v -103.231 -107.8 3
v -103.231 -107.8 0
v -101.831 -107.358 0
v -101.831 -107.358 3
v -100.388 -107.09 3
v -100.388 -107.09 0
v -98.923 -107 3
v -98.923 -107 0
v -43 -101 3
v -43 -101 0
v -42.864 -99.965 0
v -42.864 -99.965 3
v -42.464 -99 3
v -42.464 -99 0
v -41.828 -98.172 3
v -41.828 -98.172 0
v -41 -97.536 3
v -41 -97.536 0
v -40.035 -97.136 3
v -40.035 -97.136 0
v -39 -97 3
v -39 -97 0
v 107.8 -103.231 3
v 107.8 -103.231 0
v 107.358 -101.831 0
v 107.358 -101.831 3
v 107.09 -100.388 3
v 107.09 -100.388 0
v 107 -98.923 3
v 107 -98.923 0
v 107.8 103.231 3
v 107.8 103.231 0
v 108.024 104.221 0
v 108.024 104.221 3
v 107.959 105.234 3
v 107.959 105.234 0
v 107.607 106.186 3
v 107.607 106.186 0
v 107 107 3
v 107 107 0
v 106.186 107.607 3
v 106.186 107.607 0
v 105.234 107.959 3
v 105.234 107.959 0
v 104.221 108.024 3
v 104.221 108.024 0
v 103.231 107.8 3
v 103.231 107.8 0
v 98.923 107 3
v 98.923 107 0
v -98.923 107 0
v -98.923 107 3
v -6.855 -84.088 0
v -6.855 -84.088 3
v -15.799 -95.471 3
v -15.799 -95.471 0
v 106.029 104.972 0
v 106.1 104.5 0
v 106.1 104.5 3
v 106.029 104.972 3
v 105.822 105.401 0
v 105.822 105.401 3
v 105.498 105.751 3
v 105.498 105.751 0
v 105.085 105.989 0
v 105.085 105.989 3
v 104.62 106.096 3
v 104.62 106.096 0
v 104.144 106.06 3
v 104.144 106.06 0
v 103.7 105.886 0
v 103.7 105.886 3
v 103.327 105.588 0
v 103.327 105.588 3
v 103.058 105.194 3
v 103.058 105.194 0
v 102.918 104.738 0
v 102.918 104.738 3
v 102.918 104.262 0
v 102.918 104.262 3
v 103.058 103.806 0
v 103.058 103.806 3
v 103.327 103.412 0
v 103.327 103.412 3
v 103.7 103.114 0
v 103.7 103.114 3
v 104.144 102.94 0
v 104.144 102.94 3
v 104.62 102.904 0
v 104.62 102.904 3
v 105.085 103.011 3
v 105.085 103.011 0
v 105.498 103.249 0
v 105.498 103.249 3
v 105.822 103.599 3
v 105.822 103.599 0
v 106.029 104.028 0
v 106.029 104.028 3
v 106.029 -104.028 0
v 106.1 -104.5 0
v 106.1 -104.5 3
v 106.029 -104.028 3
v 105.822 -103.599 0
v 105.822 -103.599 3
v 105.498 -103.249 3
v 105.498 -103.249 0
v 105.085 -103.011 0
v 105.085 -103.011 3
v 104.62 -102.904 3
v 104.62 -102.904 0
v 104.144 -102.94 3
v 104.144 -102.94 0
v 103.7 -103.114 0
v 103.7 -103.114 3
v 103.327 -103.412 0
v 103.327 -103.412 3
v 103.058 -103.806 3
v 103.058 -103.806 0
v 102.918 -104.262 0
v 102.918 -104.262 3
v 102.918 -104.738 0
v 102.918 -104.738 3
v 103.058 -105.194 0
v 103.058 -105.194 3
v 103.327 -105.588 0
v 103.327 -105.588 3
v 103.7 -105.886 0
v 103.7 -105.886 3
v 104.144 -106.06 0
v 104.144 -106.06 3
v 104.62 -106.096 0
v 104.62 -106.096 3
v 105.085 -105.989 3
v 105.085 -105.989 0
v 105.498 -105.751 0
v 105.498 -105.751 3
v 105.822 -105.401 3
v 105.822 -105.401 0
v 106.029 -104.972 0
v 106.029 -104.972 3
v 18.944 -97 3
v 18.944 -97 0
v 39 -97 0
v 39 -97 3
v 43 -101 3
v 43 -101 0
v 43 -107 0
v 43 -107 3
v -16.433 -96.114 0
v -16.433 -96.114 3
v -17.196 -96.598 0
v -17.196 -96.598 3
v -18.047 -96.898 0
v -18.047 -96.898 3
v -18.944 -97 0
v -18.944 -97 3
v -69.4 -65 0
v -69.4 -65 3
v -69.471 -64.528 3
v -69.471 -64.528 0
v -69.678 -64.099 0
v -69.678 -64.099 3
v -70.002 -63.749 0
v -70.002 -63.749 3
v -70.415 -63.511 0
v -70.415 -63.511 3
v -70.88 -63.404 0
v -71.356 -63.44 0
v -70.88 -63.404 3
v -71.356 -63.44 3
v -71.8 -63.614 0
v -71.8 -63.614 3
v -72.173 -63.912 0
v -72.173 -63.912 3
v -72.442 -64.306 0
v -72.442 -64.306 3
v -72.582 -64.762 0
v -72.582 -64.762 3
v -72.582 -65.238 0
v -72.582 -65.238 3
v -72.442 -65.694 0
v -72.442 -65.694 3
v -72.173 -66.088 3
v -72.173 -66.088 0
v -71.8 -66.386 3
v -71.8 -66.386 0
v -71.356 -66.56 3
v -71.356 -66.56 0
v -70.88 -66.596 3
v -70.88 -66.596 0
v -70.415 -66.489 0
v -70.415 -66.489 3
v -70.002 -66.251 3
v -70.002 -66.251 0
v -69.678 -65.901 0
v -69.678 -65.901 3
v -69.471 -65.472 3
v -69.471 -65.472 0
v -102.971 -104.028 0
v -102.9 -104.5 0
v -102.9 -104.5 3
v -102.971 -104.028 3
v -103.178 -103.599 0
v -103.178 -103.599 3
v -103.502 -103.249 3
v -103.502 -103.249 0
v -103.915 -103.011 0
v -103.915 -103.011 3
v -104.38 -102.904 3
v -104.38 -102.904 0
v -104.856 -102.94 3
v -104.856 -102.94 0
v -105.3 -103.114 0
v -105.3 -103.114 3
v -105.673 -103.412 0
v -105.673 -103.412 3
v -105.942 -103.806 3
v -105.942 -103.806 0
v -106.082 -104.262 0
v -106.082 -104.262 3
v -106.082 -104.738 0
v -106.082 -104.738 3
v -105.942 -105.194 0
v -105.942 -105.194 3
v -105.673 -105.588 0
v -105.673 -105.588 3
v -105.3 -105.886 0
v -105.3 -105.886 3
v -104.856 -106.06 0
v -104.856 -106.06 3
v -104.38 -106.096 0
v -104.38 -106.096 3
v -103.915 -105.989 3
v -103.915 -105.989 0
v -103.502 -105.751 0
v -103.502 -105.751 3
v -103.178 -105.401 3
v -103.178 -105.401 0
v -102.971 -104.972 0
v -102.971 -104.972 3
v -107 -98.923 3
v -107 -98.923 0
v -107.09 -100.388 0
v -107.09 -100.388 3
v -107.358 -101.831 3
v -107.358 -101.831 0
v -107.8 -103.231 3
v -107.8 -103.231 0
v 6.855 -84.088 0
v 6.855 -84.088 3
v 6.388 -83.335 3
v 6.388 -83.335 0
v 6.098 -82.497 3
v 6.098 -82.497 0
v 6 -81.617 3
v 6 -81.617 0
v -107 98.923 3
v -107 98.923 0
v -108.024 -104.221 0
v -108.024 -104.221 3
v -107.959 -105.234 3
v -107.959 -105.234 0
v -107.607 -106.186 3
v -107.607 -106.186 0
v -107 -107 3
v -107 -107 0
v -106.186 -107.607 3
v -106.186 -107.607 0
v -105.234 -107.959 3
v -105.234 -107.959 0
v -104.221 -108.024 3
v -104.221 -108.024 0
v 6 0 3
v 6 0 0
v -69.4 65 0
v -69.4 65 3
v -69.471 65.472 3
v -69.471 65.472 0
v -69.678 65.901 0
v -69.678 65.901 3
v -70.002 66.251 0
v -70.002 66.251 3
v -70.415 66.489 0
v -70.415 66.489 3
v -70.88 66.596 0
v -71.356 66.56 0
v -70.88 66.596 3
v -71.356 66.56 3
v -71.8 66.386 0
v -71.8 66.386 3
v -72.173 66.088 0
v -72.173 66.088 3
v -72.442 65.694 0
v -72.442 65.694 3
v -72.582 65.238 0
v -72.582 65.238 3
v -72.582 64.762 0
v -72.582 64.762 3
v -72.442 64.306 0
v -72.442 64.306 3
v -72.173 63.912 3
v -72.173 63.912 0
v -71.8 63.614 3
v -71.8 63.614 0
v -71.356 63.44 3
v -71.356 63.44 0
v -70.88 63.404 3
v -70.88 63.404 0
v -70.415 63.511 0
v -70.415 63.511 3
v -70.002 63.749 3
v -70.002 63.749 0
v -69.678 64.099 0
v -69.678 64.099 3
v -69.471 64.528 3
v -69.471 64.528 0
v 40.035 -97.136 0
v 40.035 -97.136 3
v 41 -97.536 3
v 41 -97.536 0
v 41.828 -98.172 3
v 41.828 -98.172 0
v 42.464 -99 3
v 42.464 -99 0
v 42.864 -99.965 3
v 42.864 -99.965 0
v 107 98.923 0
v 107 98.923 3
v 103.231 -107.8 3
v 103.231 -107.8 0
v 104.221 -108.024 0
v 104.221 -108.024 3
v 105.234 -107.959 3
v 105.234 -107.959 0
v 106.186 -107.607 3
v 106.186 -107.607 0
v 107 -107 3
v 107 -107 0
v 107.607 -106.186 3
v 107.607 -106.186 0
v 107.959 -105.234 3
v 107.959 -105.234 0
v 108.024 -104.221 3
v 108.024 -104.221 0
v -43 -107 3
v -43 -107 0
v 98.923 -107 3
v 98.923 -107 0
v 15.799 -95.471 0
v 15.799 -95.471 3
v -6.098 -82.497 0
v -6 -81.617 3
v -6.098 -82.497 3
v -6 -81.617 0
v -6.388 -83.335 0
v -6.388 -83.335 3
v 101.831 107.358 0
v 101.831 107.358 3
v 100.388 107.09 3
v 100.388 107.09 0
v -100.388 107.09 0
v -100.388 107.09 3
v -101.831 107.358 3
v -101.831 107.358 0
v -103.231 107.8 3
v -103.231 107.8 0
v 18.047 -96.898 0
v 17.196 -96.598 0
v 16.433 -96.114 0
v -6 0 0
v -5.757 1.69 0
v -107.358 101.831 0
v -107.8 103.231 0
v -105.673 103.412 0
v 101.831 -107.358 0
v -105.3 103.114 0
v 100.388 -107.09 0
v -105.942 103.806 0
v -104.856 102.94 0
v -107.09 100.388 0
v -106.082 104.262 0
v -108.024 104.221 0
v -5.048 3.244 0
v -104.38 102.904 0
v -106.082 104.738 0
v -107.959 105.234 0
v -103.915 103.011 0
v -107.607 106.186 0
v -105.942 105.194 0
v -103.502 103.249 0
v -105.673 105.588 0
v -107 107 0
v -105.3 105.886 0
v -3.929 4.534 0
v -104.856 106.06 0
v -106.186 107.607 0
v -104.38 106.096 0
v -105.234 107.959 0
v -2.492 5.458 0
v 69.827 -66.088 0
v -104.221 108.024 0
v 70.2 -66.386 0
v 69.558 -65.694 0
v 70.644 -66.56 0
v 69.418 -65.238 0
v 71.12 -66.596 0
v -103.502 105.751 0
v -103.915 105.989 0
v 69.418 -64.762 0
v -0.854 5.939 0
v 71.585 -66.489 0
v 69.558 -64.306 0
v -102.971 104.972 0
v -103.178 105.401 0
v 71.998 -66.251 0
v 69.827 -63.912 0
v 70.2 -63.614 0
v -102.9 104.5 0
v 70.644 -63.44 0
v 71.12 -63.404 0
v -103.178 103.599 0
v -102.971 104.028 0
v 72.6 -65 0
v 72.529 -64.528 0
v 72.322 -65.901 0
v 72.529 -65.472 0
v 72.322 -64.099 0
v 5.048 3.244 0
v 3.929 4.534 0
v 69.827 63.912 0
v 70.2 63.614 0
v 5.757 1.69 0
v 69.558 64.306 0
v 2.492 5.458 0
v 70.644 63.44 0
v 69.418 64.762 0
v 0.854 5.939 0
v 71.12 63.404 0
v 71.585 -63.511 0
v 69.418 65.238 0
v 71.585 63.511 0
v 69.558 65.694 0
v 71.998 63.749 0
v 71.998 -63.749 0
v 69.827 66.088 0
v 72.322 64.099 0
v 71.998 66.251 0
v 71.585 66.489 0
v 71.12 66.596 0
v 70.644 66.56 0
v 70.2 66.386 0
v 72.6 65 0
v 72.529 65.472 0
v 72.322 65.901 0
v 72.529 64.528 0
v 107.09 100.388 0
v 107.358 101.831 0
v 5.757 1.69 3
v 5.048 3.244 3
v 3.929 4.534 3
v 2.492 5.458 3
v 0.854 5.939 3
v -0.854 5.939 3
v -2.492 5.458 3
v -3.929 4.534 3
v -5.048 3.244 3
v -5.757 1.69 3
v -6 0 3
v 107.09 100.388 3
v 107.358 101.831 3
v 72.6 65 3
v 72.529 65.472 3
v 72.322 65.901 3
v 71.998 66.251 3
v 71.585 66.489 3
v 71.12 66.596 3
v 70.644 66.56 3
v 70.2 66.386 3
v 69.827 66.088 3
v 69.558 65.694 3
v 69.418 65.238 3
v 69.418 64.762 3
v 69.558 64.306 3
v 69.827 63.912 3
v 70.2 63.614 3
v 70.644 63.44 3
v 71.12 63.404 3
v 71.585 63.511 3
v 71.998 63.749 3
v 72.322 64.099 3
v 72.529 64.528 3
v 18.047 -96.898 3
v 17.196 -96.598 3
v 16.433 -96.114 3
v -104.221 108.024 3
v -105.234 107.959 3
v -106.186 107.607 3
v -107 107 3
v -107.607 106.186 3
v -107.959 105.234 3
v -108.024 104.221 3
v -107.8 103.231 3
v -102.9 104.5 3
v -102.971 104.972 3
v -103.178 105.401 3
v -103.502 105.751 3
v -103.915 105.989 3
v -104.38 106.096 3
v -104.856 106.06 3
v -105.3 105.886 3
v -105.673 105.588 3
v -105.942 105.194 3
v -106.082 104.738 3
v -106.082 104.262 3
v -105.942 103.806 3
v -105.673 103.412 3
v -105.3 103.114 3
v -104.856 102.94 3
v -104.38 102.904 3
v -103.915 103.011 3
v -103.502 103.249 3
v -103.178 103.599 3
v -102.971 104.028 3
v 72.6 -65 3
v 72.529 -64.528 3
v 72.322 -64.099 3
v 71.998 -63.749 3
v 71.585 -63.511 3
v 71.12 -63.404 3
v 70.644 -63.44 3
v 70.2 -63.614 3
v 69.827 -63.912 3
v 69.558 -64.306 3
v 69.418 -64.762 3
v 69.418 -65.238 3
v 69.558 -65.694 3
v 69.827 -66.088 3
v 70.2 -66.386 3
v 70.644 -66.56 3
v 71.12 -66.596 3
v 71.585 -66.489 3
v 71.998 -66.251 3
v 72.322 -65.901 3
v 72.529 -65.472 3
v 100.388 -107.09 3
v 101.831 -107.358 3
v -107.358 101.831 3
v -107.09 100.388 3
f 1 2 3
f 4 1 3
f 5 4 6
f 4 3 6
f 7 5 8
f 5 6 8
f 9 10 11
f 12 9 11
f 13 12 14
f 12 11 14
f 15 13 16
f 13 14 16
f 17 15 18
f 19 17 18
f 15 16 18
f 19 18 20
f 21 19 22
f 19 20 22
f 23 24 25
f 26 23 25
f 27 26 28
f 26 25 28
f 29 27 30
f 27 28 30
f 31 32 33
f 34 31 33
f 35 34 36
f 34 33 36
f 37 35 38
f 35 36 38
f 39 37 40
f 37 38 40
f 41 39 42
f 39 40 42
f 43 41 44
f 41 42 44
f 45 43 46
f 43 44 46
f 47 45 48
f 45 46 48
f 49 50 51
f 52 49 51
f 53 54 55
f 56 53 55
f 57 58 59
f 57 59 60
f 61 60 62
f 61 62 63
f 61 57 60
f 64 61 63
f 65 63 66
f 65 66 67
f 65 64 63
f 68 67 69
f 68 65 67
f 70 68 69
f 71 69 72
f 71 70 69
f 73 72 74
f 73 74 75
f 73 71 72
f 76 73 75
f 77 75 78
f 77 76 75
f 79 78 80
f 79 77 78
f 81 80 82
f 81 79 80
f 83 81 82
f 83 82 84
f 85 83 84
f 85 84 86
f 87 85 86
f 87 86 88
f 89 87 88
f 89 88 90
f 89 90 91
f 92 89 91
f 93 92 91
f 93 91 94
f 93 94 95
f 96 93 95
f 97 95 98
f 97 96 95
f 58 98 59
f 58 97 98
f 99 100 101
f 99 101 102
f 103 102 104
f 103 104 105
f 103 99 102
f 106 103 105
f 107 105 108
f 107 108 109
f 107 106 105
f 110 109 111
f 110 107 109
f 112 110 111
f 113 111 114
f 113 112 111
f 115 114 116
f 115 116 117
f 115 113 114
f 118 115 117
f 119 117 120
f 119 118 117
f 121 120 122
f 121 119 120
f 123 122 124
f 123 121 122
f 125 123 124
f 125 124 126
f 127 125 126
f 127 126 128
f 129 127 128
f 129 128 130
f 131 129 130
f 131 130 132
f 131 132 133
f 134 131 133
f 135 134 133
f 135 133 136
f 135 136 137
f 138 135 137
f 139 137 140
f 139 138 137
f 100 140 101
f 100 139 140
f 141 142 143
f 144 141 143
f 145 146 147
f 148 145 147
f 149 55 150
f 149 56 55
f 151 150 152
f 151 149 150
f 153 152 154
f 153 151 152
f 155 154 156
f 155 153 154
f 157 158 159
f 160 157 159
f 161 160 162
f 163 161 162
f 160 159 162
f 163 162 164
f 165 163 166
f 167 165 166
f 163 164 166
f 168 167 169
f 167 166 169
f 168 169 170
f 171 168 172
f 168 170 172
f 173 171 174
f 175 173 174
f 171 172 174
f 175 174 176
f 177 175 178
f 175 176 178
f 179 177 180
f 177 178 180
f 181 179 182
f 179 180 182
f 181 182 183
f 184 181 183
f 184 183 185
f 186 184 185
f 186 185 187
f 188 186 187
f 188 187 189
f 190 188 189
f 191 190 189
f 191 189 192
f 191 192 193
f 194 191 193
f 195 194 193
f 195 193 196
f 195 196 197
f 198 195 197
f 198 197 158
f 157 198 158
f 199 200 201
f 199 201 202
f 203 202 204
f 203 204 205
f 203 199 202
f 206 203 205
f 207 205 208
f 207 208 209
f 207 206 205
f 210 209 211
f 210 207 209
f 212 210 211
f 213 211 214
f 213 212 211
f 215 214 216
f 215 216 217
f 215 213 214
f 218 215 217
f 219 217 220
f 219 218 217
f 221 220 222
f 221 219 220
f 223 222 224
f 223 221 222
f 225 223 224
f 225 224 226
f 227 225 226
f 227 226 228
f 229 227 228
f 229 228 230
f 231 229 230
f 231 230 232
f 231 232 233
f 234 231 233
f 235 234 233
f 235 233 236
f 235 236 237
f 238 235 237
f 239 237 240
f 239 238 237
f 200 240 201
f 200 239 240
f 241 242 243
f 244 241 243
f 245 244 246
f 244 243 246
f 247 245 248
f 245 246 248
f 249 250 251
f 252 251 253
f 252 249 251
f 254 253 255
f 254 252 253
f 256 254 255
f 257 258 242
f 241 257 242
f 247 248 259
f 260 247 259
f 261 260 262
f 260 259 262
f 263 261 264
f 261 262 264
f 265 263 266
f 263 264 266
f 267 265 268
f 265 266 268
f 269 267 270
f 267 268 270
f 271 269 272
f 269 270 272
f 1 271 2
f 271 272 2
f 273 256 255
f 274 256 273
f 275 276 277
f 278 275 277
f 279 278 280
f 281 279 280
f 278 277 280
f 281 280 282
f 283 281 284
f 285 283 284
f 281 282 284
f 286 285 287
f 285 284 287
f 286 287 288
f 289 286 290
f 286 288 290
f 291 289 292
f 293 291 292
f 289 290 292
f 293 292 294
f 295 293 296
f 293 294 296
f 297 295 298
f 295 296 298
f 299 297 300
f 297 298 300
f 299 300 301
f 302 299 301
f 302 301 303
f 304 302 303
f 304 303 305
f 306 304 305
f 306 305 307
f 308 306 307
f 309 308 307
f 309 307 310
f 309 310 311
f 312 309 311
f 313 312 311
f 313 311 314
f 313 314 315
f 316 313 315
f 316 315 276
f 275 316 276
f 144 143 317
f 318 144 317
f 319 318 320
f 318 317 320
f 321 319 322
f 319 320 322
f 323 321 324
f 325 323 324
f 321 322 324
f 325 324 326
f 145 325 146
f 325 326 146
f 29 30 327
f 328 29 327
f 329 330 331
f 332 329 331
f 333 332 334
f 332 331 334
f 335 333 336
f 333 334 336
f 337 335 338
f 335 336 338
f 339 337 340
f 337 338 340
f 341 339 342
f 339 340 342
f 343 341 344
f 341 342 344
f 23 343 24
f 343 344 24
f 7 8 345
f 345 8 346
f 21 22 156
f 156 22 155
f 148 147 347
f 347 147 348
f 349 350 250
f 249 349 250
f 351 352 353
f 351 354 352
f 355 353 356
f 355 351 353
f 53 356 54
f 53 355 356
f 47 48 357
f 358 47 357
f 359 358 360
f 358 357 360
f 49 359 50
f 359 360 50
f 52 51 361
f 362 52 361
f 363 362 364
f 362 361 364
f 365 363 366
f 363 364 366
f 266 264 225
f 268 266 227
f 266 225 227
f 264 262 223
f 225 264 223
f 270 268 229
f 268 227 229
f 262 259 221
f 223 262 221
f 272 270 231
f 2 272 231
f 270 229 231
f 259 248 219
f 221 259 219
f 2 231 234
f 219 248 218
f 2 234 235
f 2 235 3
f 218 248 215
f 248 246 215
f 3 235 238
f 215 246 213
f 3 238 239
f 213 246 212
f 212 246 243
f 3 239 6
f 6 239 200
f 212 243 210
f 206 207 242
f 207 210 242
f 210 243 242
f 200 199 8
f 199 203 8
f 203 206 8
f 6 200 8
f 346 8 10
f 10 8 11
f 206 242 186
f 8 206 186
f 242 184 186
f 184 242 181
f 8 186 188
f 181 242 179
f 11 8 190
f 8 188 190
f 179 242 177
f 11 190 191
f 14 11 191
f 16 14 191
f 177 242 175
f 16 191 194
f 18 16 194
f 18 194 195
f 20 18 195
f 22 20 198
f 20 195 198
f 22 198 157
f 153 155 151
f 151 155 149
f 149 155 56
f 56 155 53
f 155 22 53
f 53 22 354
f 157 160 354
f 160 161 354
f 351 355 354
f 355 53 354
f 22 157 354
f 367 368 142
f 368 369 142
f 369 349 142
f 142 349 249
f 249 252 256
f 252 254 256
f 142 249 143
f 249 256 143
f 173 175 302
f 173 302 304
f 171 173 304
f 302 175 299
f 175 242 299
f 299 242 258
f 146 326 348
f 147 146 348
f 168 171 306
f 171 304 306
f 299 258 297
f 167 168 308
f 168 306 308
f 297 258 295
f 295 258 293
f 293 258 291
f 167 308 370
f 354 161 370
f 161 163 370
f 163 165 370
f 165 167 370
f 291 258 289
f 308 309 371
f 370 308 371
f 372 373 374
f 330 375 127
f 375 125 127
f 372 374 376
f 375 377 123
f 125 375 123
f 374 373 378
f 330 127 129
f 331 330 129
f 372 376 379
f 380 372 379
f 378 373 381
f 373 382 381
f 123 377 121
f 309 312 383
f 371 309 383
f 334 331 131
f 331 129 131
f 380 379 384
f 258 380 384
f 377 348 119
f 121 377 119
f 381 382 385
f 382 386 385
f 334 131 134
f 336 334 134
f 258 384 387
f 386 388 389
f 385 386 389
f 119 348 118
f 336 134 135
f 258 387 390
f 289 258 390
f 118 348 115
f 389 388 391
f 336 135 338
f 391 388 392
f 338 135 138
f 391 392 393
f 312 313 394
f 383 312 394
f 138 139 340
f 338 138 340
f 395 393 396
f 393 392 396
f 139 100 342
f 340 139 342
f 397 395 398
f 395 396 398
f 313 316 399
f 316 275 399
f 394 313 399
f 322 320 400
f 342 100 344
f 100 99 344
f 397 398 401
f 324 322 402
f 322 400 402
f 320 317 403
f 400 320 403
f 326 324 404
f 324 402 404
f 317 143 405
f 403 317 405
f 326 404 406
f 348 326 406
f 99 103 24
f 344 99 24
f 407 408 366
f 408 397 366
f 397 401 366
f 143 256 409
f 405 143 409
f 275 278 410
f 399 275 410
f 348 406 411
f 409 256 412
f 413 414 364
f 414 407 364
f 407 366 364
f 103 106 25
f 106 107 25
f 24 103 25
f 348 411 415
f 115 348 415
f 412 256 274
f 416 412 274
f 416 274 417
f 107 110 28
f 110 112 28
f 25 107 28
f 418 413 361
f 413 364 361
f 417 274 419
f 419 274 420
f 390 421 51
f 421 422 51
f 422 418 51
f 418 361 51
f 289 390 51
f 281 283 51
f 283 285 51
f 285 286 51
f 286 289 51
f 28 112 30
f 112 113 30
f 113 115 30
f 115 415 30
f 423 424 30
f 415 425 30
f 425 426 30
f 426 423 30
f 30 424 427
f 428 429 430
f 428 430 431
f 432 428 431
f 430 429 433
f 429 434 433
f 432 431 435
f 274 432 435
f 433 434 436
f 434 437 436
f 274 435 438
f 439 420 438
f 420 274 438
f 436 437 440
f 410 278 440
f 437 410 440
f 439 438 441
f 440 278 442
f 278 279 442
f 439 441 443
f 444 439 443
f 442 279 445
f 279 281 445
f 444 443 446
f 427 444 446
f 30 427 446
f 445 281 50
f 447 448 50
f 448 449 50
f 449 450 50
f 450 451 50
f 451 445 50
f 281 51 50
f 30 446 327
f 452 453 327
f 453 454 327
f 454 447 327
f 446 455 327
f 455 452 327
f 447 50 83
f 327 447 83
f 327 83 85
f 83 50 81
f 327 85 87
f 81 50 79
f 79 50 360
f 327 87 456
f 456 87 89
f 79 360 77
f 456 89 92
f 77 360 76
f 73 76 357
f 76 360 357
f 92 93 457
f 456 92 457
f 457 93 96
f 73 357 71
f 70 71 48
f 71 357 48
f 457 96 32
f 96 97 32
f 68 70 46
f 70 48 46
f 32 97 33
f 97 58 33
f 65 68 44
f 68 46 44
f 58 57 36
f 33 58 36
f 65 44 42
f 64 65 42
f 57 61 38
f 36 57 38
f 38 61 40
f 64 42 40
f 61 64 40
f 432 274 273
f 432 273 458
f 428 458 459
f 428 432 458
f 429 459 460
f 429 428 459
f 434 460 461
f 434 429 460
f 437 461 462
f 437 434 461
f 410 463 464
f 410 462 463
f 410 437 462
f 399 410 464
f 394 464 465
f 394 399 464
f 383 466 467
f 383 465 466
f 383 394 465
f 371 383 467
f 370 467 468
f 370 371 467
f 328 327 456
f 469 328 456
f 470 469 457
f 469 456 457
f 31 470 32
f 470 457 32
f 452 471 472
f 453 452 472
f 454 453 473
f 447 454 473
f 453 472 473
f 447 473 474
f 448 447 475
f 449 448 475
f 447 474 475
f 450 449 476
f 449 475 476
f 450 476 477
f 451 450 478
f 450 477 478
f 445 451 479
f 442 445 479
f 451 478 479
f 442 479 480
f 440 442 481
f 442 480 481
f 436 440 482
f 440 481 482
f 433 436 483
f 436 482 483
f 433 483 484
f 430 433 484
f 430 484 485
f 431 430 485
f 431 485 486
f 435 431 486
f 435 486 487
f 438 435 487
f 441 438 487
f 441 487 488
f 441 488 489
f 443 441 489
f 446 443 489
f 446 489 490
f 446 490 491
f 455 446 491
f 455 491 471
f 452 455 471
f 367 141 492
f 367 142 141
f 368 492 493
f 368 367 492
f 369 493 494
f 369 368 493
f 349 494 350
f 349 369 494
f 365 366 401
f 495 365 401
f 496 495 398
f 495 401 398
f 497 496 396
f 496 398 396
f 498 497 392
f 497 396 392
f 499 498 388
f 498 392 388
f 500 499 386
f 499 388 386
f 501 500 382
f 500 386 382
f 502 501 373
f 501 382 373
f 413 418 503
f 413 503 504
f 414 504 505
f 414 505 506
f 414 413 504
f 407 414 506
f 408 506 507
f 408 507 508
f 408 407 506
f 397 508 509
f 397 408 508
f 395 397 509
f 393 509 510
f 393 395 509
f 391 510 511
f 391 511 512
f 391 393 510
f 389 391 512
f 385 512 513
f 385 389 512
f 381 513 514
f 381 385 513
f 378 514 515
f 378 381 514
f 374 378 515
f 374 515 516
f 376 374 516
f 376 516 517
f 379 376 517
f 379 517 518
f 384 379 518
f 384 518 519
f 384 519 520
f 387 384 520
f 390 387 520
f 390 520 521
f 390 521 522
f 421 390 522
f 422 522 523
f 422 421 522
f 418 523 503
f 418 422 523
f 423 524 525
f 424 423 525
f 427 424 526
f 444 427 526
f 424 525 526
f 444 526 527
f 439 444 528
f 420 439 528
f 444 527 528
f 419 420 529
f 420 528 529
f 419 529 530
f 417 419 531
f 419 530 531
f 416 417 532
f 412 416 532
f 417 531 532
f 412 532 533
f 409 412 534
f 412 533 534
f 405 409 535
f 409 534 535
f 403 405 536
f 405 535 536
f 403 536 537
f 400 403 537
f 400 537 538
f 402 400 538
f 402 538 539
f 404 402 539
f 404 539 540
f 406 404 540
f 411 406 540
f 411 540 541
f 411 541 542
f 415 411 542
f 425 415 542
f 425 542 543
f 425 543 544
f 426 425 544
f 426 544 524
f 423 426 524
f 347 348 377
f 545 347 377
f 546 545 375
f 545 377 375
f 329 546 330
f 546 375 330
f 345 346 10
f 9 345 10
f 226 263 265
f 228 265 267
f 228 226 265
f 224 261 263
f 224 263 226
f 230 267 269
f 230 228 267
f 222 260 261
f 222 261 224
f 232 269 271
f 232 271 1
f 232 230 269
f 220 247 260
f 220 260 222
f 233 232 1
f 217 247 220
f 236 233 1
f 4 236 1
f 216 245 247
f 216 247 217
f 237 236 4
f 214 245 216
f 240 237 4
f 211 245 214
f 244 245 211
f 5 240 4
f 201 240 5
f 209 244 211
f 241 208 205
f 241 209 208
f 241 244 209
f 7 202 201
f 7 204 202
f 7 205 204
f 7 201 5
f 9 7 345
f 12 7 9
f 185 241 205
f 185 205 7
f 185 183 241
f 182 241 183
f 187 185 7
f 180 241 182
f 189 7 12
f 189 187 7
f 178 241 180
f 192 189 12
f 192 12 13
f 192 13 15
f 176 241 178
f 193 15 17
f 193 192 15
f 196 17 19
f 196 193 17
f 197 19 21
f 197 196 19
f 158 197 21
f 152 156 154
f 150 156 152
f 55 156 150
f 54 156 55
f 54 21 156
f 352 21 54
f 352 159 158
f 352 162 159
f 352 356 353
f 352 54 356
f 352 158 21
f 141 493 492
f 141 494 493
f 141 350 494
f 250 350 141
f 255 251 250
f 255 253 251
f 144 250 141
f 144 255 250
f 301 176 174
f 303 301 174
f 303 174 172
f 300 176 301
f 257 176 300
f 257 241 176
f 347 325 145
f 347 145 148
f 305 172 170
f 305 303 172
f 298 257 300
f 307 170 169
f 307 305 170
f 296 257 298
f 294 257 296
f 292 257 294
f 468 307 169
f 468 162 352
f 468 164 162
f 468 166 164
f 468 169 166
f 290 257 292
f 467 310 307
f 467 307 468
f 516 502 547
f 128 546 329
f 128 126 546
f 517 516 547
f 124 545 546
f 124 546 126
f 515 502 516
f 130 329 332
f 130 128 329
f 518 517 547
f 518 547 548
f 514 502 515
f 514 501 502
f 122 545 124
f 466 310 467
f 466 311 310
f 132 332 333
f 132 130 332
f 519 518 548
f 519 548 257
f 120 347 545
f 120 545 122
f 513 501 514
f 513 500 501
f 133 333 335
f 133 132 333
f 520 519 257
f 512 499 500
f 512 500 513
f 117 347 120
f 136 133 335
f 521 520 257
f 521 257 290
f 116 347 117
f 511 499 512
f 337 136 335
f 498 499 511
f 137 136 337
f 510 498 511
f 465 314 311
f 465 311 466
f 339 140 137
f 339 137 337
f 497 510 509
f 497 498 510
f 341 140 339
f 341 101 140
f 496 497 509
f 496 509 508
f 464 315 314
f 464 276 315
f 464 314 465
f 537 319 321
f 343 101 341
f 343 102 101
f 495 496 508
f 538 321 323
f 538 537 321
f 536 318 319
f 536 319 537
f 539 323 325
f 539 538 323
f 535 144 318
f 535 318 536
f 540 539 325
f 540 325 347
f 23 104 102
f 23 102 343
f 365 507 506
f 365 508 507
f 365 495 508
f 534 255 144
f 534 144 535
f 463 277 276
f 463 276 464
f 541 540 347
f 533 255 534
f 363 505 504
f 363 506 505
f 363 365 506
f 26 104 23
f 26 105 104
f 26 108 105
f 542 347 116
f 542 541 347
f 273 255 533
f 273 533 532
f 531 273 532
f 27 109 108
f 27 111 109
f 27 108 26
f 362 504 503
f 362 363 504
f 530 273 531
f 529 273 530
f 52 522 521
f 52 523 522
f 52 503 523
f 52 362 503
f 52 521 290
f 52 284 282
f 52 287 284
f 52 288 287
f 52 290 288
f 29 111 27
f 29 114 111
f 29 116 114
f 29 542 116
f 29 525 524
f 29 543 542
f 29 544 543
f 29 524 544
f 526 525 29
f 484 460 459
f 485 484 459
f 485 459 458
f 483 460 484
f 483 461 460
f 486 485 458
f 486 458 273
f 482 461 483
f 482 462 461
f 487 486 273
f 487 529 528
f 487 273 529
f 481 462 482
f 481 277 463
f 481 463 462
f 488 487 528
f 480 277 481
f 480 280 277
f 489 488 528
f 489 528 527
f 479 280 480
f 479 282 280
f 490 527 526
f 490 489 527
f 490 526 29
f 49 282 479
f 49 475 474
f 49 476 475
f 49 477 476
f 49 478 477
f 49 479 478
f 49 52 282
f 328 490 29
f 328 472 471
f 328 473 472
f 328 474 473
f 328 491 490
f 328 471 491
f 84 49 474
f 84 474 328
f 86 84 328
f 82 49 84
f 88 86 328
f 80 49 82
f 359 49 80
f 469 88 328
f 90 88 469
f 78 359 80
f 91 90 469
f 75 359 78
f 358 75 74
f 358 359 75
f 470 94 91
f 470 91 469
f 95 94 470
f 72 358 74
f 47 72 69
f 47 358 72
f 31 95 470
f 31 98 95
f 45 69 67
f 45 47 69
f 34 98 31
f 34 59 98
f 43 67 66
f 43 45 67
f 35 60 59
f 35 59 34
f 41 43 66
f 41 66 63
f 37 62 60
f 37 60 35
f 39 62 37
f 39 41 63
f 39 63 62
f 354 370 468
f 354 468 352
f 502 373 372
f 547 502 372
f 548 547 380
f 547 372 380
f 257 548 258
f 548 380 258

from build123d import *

# Parameters (mm, degrees)
SKETCH1_R           = 1.6
BOSS_EXTRUDE1_DEPTH = 3
CUT_EXTRUDE1_DEPTH  = 4
CUT_EXTRUDE3_DEPTH  = 4
FILLET1_R           = 4
SKETCH3_R           = 1.6
CUT_EXTRUDE2_DEPTH  = 4


with BuildPart() as part:
    # Sketch1 → Boss-Extrude1 (new body)
    with BuildSketch(Plane.XY):
        with BuildLine():
            Line((-107, 98.923010333), (-107, -98.923010333))
            ThreePointArc((-107, -98.923010333), (-107.201661971, -101.11372249), (-107.799869959, -103.230804092))
            ThreePointArc((-107.799869959, -103.230804092), (-107, -107), (-103.230804092, -107.799869959))
            ThreePointArc((-103.230804092, -107.799869959), (-101.11372249, -107.201661971), (-98.923010333, -107))
            Line((-98.923010333, -107), (-43, -107))
            Line((-43, -107), (-43, -101))
            ThreePointArc((-43, -101), (-41.828427125, -98.171572875), (-39, -97))
            Line((-39, -97), (39, -97))
            ThreePointArc((39, -97), (41.828427125, -98.171572875), (43, -101))
            Line((43, -101), (43, -107))
            Line((43, -107), (98.923010333, -107))
            ThreePointArc((98.923010333, -107), (101.11372249, -107.201661971), (103.230804092, -107.799869959))
            ThreePointArc((103.230804092, -107.799869959), (107, -107), (107.799869959, -103.230804092))
            ThreePointArc((107.799869959, -103.230804092), (107.201661971, -101.11372249), (107, -98.923010333))
            Line((107, -98.923010333), (107, 98.923010333))
            ThreePointArc((107, 98.923010333), (107.201661971, 101.11372249), (107.799869959, 103.230804092))
            ThreePointArc((107.799869959, 103.230804092), (107, 107), (103.230804092, 107.799869959))
            ThreePointArc((103.230804092, 107.799869959), (101.11372249, 107.201661971), (98.923010333, 107))
            Line((98.923010333, 107), (-98.923010333, 107))
            ThreePointArc((-98.923010333, 107), (-101.11372249, 107.201661971), (-103.230804092, 107.799869959))
            ThreePointArc((-103.230804092, 107.799869959), (-107, 107), (-107.799869959, 103.230804092))
            ThreePointArc((-107.799869959, 103.230804092), (-107.201661971, 101.11372249), (-107, 98.923010333))
        make_face()
        with Locations((-104.5, -104.5)):
            Circle(SKETCH1_R, mode=Mode.SUBTRACT)
        with Locations((-104.5, 104.5)):
            Circle(SKETCH1_R, mode=Mode.SUBTRACT)
        with Locations((104.5, 104.5)):
            Circle(SKETCH1_R, mode=Mode.SUBTRACT)
        with Locations((104.5, -104.5)):
            Circle(SKETCH1_R, mode=Mode.SUBTRACT)
    extrude(amount=BOSS_EXTRUDE1_DEPTH)

    # Sketch2 → Cut-Extrude1 (cut, through all)
    with BuildSketch(Plane(origin=(0, 0, 0), x_dir=(-1, 0, 0), z_dir=(0, 0, -1))):
        with BuildLine():
            Line((6, -97), (-6, -97))
            Line((-6, -97), (-6, 0))
            ThreePointArc((-6, 0), (0, 6), (6, 0))
            Line((6, 0), (6, -97))
        make_face()
    extrude(amount=-CUT_EXTRUDE1_DEPTH, mode=Mode.SUBTRACT)

    # Sketch4 → Cut-Extrude3 (cut, through all)
    with BuildSketch(Plane.XY.offset(3)):
        Polygon((-17, -97), (17, -97), (6, -83), (-6, -83), align=None)
    extrude(amount=-CUT_EXTRUDE3_DEPTH, mode=Mode.SUBTRACT)

    # Fillet1
    fillet1_edges = [part.edges().sort_by_distance(p)[0] for p in [
        (-17, -97, 1.5),
        (-6, -83, 1.5),
        (6, -83, 1.5),
        (17, -97, 1.5),
    ]]
    fillet(fillet1_edges, radius=FILLET1_R)

    # Sketch3 → Cut-Extrude2 (cut, through all)
    with BuildSketch(Plane.XY.offset(3)):
        with Locations((-71, 65)):
            Circle(SKETCH3_R)
        with Locations((71, 65)):
            Circle(SKETCH3_R)
        with Locations((71, -65)):
            Circle(SKETCH3_R)
        with Locations((-71, -65)):
            Circle(SKETCH3_R)
    extrude(amount=-CUT_EXTRUDE2_DEPTH, mode=Mode.SUBTRACT)


solid = part.part
